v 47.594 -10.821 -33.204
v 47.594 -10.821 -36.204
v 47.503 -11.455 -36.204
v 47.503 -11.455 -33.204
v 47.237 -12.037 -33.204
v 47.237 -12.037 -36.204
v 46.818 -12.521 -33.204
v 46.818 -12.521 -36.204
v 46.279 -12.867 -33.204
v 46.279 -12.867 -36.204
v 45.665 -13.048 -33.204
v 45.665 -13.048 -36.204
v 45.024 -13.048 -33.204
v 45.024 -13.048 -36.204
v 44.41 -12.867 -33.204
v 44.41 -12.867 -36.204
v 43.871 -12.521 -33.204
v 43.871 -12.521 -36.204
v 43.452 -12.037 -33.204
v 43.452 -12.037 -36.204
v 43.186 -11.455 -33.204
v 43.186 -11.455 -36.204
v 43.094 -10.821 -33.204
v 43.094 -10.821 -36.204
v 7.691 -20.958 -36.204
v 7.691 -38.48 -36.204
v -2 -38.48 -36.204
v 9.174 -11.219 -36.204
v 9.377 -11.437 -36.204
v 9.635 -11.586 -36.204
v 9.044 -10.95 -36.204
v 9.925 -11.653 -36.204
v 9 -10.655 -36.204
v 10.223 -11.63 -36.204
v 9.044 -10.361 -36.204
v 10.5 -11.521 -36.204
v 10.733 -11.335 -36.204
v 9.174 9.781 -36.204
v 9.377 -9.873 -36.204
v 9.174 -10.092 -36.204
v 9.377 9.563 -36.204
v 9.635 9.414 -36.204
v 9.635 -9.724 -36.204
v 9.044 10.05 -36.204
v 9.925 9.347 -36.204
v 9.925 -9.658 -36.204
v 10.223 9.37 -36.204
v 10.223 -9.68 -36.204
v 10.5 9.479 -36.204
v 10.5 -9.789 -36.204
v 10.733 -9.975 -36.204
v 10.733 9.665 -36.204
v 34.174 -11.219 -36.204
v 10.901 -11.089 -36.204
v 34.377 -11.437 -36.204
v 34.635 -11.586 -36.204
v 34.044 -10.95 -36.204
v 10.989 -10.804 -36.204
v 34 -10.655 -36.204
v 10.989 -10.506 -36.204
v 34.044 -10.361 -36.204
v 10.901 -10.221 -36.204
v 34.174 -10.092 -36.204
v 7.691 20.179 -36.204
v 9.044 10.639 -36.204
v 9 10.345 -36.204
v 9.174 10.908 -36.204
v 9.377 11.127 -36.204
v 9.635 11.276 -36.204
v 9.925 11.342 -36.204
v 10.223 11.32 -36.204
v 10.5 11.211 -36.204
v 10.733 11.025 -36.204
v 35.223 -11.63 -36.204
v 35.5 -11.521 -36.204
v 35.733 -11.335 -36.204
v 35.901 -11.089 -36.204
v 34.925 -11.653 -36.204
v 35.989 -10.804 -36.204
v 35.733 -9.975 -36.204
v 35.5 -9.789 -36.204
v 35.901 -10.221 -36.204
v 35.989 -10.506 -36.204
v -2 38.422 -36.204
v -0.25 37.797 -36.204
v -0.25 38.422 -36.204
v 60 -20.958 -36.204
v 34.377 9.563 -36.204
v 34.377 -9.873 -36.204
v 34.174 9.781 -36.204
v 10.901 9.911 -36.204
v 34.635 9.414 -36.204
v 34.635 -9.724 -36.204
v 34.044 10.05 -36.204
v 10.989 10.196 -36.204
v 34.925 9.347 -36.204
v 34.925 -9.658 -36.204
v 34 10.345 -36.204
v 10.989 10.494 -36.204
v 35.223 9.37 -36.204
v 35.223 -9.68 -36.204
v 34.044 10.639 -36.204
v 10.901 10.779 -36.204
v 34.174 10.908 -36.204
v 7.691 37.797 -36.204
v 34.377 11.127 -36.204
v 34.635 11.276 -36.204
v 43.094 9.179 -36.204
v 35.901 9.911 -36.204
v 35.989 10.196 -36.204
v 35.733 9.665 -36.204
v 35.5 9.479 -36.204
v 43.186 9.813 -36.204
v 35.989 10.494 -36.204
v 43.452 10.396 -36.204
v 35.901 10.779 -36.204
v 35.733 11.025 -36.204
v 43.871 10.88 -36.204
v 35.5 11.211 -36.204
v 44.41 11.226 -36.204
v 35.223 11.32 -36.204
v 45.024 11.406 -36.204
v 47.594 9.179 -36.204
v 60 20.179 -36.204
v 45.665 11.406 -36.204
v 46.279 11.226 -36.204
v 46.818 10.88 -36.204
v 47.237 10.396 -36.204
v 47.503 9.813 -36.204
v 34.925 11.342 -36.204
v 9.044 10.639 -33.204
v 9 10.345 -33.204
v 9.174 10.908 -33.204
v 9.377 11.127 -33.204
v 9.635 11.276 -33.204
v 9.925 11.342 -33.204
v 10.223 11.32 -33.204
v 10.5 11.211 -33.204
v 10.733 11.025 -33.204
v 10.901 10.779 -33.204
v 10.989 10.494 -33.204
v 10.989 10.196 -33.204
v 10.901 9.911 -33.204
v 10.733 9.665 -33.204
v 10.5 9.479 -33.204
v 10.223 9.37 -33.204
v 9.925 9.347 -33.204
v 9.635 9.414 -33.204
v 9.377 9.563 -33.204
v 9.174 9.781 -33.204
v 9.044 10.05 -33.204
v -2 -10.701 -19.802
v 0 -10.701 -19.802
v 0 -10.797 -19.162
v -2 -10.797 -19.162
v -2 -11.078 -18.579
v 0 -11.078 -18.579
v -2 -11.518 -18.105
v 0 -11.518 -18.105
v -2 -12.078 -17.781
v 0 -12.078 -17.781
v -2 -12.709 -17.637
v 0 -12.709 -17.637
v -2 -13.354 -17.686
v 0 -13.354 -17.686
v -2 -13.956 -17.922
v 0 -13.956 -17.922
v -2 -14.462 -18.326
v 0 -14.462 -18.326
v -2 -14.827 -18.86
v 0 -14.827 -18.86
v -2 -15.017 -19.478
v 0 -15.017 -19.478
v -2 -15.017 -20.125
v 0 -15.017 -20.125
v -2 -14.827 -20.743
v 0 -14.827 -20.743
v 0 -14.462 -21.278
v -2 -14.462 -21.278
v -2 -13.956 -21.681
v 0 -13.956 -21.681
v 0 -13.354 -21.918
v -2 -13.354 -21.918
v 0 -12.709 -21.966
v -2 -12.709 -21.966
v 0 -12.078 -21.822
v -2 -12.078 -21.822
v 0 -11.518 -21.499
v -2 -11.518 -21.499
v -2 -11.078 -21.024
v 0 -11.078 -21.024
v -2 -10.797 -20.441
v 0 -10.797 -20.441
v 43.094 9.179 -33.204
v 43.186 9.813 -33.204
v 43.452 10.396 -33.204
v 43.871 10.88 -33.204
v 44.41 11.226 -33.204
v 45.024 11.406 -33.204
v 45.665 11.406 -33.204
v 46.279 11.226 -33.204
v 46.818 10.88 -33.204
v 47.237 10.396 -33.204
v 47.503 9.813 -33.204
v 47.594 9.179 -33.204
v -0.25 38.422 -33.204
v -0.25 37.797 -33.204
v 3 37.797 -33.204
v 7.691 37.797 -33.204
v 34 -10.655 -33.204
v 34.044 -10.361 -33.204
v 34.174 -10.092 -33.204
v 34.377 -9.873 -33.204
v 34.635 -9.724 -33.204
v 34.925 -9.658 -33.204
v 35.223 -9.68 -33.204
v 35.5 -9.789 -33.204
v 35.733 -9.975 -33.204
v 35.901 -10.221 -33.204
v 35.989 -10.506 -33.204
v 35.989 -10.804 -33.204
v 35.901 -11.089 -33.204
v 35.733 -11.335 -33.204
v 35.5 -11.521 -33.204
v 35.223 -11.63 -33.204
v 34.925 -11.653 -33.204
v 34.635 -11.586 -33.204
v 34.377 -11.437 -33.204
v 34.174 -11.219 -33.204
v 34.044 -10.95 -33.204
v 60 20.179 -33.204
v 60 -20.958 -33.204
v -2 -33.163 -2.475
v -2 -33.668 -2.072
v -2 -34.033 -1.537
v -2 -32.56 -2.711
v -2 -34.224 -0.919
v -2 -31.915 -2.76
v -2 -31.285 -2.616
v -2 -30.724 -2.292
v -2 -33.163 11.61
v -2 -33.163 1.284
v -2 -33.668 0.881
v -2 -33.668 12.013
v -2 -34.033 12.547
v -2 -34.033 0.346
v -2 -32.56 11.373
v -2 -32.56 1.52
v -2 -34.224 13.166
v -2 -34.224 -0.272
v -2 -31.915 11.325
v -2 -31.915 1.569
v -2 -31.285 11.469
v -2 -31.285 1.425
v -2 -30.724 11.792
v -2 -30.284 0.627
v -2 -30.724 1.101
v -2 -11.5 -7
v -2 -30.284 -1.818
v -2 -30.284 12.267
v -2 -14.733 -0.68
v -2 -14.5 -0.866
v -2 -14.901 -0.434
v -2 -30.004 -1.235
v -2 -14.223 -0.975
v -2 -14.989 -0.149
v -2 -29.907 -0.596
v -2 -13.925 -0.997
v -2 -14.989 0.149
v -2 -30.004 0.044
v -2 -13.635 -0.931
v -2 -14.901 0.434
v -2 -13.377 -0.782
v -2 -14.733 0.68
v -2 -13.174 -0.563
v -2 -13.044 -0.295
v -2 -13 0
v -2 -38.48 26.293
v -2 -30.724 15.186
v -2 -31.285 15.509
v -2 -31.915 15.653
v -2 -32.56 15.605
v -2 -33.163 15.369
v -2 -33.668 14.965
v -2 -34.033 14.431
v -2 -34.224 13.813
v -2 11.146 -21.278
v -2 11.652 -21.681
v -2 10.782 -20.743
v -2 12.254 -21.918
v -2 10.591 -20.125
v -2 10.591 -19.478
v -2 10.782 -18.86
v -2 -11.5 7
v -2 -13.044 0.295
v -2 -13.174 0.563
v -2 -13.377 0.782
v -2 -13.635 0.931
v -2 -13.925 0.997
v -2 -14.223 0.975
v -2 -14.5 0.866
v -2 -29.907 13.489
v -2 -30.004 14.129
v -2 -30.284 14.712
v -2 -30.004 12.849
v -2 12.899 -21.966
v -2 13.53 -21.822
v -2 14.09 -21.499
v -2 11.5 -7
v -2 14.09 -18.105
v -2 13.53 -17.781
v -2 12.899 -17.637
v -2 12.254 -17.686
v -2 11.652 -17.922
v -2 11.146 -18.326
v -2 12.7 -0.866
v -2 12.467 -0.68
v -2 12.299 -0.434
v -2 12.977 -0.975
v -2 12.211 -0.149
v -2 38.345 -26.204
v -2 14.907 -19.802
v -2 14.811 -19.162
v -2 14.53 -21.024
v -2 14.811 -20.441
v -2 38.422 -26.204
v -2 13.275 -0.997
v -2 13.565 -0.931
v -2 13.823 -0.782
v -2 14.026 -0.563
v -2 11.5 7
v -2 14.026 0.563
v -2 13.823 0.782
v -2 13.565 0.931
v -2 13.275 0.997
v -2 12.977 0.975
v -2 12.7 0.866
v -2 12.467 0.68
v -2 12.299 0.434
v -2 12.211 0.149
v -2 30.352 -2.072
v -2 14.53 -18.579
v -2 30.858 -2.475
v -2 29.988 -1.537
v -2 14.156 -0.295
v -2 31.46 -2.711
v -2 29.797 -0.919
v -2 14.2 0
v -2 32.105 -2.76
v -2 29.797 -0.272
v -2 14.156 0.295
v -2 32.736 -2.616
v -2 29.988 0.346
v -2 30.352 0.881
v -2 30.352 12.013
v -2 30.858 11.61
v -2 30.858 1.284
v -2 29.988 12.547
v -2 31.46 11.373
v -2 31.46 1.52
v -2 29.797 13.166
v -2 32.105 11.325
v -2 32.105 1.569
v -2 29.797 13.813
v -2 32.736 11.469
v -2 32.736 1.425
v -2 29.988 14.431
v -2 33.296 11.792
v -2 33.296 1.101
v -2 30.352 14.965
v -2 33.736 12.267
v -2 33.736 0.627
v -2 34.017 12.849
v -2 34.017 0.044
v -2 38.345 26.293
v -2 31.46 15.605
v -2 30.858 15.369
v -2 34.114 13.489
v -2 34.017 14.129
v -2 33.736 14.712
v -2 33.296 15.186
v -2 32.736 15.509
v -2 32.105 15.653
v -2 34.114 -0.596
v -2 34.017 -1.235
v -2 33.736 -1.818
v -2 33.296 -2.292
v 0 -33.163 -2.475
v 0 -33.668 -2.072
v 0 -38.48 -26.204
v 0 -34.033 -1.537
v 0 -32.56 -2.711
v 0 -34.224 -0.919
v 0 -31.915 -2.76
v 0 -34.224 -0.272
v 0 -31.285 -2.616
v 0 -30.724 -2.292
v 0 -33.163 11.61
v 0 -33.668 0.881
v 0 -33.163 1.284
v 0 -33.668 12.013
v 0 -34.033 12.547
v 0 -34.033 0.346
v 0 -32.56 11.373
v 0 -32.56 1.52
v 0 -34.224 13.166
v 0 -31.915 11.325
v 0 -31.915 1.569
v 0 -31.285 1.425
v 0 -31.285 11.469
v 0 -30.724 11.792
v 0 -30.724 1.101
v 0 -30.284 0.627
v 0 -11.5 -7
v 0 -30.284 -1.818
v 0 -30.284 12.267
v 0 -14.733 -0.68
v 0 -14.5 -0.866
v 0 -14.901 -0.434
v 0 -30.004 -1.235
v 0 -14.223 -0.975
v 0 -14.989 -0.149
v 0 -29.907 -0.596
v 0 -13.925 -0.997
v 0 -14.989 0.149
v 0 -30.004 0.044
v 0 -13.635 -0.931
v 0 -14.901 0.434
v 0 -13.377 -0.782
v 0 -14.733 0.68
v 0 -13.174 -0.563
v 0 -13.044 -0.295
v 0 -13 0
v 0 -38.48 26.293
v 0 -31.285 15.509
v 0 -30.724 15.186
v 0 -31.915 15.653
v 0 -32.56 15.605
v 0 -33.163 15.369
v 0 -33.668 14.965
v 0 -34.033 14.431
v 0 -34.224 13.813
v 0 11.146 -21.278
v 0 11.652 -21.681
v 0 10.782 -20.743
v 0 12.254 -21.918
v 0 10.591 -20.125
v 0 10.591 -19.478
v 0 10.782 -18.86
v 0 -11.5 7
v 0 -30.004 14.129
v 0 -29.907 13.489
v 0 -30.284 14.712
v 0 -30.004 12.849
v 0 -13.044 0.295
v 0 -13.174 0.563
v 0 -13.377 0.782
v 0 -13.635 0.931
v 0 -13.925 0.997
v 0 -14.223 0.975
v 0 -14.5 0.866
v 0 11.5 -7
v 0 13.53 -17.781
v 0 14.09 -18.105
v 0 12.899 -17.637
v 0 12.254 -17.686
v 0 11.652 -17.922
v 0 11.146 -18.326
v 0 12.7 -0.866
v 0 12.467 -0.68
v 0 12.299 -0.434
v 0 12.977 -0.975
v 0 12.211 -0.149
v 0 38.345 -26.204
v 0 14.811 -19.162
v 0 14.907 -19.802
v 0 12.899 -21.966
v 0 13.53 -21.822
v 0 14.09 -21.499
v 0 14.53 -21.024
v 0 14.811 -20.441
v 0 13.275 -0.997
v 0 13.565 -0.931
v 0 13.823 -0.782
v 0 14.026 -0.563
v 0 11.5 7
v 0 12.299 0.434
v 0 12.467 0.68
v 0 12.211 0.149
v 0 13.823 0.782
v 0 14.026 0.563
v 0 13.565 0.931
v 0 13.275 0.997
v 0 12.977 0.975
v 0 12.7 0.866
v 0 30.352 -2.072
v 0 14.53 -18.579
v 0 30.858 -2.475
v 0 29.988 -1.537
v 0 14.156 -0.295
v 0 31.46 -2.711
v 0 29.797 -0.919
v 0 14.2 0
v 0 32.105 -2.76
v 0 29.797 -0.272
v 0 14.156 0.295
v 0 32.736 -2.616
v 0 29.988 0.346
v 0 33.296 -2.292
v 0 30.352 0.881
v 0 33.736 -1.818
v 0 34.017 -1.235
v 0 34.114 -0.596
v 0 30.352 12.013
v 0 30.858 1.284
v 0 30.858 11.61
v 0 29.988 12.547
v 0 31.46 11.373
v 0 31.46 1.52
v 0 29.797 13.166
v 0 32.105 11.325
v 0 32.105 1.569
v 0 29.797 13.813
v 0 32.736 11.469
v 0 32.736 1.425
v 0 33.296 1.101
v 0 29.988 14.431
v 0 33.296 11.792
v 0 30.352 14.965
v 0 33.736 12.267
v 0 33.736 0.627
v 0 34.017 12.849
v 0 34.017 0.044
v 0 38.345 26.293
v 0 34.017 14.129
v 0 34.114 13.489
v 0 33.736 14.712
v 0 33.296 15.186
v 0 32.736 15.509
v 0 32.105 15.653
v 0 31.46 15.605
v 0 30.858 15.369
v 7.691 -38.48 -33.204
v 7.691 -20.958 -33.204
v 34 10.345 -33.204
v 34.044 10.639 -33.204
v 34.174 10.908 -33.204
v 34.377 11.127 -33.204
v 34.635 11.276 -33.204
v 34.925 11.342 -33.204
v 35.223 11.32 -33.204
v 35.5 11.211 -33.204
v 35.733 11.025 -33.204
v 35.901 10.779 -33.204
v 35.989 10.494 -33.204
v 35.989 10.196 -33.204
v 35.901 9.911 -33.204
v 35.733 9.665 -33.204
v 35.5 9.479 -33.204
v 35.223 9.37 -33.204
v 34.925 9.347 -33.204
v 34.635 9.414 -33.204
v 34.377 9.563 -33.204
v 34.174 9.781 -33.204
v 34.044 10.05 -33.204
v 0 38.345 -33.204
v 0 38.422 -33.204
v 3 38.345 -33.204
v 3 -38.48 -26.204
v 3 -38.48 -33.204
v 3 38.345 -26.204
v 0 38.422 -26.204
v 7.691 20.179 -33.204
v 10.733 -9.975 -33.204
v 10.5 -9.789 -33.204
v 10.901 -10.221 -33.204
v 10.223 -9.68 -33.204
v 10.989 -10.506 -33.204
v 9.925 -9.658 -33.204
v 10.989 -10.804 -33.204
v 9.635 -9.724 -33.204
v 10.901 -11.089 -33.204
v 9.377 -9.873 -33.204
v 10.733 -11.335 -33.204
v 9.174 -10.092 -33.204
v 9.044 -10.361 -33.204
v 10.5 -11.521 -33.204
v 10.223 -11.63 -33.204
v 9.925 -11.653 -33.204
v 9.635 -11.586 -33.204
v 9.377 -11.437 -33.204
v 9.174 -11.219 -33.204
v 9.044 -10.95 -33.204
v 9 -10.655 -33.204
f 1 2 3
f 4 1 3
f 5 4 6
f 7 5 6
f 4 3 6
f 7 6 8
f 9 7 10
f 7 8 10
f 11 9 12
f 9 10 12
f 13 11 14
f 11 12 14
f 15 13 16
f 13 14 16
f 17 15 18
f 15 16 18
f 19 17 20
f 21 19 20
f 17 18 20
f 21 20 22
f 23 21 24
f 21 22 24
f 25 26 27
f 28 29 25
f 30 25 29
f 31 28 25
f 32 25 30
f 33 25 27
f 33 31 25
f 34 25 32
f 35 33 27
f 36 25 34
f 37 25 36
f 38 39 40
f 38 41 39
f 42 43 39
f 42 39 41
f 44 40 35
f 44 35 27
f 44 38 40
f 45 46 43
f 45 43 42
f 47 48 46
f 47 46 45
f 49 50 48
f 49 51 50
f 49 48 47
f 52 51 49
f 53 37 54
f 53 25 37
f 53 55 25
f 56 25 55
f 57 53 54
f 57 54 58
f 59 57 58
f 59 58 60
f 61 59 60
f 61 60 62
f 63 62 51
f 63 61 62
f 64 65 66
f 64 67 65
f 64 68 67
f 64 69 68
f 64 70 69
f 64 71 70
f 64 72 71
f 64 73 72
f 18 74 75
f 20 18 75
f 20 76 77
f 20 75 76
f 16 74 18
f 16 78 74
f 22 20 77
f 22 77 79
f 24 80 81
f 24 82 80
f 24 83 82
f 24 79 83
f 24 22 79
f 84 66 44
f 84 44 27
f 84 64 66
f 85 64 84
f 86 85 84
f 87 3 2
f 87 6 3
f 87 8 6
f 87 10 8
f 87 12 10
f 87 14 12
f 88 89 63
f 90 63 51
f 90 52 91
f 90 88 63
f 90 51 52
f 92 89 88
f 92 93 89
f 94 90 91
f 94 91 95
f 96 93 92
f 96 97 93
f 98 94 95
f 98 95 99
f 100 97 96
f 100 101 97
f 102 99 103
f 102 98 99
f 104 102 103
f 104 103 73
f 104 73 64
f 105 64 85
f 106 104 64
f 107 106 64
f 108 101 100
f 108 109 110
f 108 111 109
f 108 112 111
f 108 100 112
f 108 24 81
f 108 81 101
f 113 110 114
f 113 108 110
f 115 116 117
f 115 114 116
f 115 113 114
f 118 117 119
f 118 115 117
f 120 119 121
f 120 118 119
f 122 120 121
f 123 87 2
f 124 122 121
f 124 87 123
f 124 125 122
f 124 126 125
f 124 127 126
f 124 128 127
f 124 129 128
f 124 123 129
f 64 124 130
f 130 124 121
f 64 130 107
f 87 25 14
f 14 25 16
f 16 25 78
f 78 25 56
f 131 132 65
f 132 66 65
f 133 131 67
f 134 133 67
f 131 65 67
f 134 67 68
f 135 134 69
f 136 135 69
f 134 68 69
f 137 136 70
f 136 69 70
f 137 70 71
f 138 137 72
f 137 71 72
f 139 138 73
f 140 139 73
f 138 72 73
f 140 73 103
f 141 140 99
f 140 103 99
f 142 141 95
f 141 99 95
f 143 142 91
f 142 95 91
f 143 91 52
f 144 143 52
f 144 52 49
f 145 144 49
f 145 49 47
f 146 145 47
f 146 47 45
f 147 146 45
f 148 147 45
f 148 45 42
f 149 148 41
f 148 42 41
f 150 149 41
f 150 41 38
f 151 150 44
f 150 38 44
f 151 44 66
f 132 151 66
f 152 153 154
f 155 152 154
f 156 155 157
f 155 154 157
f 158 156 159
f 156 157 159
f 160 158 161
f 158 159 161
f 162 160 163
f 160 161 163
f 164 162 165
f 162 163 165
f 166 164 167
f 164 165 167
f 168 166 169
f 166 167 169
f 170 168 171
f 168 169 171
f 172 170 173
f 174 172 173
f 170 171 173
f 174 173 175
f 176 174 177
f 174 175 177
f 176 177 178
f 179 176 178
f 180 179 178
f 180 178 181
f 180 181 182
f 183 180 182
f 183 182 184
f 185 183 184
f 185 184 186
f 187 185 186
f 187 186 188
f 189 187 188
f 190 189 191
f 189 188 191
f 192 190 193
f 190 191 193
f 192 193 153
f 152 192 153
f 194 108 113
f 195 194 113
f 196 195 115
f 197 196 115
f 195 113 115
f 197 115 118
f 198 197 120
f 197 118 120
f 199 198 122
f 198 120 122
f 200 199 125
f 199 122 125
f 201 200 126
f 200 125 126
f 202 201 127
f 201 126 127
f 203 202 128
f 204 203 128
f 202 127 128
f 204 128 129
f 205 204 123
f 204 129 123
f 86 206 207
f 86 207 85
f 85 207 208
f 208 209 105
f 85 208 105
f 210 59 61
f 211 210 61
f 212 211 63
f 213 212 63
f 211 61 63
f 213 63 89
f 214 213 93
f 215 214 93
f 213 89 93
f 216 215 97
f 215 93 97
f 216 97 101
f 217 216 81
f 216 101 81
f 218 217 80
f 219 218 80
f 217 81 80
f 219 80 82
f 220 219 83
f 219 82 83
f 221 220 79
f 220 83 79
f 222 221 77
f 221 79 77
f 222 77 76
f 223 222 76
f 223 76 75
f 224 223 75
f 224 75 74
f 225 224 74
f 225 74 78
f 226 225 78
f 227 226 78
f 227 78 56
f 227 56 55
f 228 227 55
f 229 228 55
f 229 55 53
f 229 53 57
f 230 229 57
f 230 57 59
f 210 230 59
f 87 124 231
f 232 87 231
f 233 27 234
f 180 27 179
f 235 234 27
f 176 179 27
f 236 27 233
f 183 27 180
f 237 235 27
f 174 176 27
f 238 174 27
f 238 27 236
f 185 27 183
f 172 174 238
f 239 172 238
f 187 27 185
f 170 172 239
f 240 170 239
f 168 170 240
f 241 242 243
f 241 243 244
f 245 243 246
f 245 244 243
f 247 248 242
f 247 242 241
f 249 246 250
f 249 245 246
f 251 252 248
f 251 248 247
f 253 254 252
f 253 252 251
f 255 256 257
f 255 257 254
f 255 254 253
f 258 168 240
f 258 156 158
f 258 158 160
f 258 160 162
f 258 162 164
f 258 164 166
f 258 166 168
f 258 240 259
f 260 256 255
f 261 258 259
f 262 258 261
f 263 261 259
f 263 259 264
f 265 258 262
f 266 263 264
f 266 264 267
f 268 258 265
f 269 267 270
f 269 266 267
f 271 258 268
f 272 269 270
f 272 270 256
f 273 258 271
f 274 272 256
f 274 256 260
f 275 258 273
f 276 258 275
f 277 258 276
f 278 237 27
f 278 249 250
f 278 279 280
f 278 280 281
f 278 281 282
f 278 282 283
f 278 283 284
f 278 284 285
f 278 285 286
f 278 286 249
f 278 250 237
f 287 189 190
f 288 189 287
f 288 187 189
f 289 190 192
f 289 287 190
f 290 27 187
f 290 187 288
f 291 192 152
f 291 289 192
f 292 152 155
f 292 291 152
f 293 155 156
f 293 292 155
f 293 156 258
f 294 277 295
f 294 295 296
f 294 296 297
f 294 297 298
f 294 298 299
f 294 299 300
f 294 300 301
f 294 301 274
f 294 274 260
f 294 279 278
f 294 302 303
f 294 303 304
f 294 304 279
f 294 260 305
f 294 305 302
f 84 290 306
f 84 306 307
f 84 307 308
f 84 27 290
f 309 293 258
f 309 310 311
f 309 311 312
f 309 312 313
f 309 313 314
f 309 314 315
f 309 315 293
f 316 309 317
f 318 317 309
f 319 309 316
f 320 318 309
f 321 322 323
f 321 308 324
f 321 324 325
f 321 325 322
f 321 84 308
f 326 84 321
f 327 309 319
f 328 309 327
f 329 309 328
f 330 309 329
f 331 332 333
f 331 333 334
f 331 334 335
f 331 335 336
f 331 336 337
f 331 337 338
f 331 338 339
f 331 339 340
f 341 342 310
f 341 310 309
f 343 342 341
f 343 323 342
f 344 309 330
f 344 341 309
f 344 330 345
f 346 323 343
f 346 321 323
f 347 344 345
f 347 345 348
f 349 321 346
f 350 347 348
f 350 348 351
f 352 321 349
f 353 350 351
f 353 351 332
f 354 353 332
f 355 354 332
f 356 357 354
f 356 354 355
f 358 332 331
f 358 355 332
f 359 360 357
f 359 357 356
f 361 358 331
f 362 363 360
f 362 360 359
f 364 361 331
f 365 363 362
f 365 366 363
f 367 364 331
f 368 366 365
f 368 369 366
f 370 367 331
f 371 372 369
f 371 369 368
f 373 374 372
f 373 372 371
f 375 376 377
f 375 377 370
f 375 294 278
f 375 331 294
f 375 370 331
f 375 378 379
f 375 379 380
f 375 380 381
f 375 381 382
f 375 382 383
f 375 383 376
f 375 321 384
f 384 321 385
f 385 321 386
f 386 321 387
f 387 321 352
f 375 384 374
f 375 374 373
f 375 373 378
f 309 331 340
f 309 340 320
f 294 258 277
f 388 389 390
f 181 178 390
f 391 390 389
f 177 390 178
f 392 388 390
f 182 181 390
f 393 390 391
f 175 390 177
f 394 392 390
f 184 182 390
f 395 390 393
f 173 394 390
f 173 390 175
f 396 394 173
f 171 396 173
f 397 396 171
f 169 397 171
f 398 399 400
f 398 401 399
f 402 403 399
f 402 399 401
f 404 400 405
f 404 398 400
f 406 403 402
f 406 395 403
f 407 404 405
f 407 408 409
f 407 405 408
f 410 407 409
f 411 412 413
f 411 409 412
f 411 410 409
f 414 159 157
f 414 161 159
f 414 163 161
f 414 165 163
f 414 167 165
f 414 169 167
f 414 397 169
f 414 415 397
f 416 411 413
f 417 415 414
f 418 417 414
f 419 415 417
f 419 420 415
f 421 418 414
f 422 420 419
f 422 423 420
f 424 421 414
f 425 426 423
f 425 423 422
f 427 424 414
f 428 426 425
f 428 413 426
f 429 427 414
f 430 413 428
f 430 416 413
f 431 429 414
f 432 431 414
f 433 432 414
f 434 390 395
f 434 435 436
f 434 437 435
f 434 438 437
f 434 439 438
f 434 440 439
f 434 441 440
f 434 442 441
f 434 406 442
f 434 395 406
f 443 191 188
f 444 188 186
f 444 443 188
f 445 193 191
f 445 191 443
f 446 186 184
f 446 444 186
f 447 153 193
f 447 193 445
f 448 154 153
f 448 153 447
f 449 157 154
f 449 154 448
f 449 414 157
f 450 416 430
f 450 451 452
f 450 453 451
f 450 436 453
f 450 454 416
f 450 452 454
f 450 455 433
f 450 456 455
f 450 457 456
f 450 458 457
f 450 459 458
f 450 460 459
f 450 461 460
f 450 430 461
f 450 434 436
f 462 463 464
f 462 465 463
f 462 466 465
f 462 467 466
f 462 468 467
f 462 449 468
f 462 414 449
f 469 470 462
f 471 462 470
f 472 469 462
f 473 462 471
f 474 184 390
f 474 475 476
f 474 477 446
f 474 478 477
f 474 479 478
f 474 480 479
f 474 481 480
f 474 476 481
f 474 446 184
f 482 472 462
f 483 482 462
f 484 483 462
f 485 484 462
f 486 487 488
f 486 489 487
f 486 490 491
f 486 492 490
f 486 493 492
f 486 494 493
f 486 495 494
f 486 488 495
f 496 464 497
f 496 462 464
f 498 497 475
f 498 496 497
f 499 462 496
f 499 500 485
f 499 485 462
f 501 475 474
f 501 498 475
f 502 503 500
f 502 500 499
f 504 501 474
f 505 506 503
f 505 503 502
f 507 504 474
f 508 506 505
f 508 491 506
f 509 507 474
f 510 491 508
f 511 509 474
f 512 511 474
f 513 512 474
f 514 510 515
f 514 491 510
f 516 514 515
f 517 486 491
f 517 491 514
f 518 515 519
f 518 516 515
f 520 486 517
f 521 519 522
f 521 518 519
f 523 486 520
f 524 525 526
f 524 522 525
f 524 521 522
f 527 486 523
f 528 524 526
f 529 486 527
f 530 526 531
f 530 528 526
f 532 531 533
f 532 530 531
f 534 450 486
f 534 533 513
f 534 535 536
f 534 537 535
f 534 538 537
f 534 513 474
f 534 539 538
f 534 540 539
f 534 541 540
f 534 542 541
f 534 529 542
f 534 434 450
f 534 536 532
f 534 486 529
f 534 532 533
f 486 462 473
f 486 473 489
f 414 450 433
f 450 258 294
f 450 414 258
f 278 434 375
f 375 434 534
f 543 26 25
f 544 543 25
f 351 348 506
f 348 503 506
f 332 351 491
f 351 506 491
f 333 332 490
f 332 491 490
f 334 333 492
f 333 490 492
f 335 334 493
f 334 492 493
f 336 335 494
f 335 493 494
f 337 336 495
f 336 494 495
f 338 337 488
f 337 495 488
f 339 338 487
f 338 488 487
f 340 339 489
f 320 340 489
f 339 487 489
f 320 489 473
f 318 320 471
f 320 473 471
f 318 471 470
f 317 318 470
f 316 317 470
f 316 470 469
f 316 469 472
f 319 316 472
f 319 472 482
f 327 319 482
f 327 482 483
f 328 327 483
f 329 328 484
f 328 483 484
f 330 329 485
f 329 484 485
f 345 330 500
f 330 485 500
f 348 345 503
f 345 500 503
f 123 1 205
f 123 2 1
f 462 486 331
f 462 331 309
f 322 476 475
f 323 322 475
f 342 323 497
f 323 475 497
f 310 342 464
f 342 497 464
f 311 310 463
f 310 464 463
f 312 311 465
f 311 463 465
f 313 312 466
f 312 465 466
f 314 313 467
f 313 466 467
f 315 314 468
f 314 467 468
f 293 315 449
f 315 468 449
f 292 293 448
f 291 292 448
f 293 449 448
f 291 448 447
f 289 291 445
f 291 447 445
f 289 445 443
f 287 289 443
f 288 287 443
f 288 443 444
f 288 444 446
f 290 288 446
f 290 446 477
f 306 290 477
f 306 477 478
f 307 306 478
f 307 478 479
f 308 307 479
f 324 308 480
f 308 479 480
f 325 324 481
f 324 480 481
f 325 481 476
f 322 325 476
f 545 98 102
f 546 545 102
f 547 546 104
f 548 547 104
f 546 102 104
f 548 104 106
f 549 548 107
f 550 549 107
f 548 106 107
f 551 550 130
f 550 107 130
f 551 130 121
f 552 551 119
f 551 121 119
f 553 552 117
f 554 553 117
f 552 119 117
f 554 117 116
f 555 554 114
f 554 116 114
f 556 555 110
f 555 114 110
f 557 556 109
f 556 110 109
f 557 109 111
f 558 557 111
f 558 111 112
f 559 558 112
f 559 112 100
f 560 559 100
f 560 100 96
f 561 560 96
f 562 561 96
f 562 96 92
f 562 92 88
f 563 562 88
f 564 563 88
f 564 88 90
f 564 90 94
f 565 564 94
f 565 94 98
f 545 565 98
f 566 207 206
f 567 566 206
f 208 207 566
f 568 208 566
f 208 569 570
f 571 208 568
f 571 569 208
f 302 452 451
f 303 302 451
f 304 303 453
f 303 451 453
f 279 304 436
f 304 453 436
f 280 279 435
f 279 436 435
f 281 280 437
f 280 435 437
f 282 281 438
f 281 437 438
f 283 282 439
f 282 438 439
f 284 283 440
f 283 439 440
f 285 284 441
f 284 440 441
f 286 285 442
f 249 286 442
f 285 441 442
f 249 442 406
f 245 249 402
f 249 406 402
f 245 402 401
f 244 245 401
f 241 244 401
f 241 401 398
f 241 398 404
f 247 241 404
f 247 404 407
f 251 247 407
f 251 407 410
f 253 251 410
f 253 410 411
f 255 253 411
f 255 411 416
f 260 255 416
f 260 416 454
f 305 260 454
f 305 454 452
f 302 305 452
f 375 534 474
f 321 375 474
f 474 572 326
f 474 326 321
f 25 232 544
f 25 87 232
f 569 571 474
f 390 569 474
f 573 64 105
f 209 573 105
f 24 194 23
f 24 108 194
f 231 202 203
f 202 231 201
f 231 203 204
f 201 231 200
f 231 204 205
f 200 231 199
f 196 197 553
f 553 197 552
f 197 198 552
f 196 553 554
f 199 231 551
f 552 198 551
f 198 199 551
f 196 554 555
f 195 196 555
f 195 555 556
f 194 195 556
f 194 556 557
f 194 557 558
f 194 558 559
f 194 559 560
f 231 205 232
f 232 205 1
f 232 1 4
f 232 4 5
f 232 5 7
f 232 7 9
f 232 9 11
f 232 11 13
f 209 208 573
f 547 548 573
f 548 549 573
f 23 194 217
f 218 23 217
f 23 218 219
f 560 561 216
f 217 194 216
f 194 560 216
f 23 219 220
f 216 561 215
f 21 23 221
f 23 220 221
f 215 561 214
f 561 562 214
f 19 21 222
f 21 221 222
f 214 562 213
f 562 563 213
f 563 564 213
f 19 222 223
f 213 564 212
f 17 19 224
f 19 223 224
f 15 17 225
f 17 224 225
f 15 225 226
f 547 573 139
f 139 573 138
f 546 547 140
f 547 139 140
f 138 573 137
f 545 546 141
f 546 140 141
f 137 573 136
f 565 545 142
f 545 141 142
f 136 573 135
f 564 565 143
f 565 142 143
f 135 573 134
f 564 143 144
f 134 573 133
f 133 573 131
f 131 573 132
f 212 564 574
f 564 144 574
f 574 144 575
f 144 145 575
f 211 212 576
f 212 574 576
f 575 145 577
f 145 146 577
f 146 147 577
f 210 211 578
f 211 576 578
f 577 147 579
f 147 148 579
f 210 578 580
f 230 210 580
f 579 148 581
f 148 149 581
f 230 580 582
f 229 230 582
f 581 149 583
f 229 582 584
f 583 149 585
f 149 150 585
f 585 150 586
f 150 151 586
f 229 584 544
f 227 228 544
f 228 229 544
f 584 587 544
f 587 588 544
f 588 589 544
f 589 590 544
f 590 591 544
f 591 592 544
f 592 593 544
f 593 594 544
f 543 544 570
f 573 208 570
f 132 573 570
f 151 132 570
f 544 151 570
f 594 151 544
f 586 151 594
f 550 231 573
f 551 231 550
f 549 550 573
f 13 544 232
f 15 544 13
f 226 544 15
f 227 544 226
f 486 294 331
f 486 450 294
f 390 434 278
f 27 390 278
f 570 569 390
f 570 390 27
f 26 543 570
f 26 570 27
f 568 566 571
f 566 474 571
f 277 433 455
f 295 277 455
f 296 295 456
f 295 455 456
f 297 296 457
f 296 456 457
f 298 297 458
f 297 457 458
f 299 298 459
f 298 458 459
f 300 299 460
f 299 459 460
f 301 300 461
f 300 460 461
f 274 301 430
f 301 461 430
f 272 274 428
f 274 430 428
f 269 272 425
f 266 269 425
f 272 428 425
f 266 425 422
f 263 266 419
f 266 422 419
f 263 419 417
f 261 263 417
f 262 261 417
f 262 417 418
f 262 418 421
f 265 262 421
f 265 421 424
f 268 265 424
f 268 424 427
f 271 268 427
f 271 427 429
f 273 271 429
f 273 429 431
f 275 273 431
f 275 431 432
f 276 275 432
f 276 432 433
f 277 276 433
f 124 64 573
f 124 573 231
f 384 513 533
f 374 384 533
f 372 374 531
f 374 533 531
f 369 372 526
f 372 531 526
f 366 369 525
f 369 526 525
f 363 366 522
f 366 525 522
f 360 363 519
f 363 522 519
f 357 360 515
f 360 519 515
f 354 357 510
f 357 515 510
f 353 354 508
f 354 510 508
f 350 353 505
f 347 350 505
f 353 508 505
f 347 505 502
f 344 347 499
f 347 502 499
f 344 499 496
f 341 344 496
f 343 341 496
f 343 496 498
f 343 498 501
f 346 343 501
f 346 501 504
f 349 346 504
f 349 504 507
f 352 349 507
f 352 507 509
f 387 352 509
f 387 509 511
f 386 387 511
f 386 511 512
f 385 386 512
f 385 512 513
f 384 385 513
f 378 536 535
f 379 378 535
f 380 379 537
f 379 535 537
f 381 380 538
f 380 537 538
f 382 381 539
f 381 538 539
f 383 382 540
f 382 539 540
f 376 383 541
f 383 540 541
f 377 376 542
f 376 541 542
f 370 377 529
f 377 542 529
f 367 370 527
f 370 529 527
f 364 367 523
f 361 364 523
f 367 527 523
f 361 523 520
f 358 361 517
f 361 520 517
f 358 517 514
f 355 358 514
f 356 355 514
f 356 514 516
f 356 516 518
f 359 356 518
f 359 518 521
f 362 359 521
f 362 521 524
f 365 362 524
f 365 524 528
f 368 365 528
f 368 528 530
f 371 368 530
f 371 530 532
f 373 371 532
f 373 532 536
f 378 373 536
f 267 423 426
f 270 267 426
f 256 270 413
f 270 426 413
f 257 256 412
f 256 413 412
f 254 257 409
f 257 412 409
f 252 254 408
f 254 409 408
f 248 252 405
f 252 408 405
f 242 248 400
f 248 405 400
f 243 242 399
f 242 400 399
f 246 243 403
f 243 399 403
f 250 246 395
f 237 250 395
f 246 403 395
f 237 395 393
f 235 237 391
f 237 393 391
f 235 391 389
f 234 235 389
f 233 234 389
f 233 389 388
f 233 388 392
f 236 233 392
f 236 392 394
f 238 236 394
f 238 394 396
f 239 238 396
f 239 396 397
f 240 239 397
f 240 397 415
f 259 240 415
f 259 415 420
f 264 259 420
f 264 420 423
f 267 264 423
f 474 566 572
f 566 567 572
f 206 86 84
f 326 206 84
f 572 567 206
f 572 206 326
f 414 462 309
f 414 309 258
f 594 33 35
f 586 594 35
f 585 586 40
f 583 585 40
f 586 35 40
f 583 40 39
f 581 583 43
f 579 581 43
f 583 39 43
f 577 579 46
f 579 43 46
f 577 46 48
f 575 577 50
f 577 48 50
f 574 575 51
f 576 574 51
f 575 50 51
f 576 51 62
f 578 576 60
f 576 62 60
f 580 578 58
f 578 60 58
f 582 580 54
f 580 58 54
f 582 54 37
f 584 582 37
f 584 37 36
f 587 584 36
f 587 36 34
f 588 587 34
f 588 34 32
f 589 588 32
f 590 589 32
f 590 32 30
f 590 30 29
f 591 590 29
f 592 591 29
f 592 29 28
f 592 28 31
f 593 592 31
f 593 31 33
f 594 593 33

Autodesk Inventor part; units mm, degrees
sketch "Sketch1" plane through (0, 0, 0) normal (1, 0, 0) x (0, 1, 0)
  circle A0 centre (-12.8712, -19.8017) radius 2.1703
  circle A1 centre (-32.0775, -0.5955) radius 2.1703
  circle A2 centre (31.9433, -0.5955) radius 2.1703
  circle A3 centre (31.9433, 13.4891) radius 2.1703
  circle A4 centre (-32.0775, 13.4891) radius 2.1703
  circle A5 centre (12.7371, -19.8017) radius 2.1703
  line L0 (38.3454, 26.2933) -> (38.3454, -26.2038)
  line L1 (-38.4796, 26.2933) -> (38.3454, 26.2933)
  line L2 (-38.4796, 26.2933) -> (-38.4796, -26.2038)
  line L3 (38.3454, -26.2038) -> (-38.4796, -26.2038)
  circle A6 centre (-32.0775, 13.4891) radius 2.1703
  circle A7 centre (-32.0775, -0.5955) radius 2.1703
  line L4 (11.5, -7) -> (-11.5, -7)
  line L5 (-11.5, -7) -> (-11.5, 7)
  line L6 (-11.5, 7) -> (11.5, 7)
  line L7 (11.5, 7) -> (11.5, -7)
  line L8 (11.5, -7) -> (-11.5, 7) construction
  line L9 (-11.5, -7) -> (11.5, 7) construction
  circle A8 centre (13.2, 0) radius 1
  circle A9 centre (-14, 0) radius 1
  point P0 (0, 0)
  point P1 (-11.5, 0)
  dimension "d26" = 23
  dimension "d27" = 14
  dimension "d28" = 27.2
  dimension "d29" = 2
  dimension "d30" = 2.5
ref_plane "Work Plane6" through (0, -38.4796, -26.2038) normal (0, 0, -1) x (-1, 0, 0)
sketch "Sketch3" plane through (0, -38.4796, -26.2038) normal (0, 0, -1) x (-1, 0, 0)
  line L0 (0, 76.825) -> (-3, 76.825) projected
  line L1 (0, 0) -> (-3, 0) projected
  line L2 (-3, 76.825) -> (0, 76.825)
  line L3 (0, 76.825) -> (0, 0)
  line L4 (0, 0) -> (-3, 0)
  line L5 (-3, 0) -> (-3, 76.825)
  line L6 (0, 0) -> (0, 76.825) projected
  line L7 (-3, 0) -> (-3, 76.825) projected
  line L8 (0.01, -0.01) -> (0.01, 76.835)
  line L9 (0.01, 76.835) -> (-3.01, 76.835)
  line L10 (-3.01, 76.835) -> (-3.01, -0.01)
  line L11 (-3.01, -0.01) -> (0.01, -0.01)
  point P0 (0, 38.4796)
  dimension "d3" = 0.01
extrude "Extrusion2" add sketch "Sketch3" along normal blind 10 contours L3 L1 L5 L0
ref_plane "Work Plane3" through (0, 0, 0) normal (-1, 0, 0) x (0, 0, 1)
sketch "Sketch4" plane through (0, 0, 0) normal (-1, 0, 0) x (0, 0, 1)
  line L0 (26.2933, -38.4796) -> (-36.2038, -38.4796) projected
  line L1 (-36.2038, 38.422) -> (-33.2038, 38.422)
  line L2 (-33.2038, 38.422) -> (-33.2038, -38.4796)
  line L3 (-33.2038, -38.4796) -> (-36.2038, -38.4796)
  line L4 (-36.2038, -38.4796) -> (-36.2038, 38.422)
  line L5 (-36.2038, 38.3454) -> (-36.2038, -38.4796) projected
  point P0 (0, 0)
  dimension "d8" = 3
extrude "Extrusion3" add sketch "Sketch4" against normal blind 60
ref_plane "Work Plane1" through (0, -38.4796, -36.2038) normal (0, 0, -1) x (-1, 0, 0)
ref_plane "Work Plane4" through (0, -38.4796, -36.2038) normal (0, 0, -1) x (-1, 0, 0)
sketch "Sketch6" plane through (0, -38.4796, -36.2038) normal (0, 0, -1) x (-1, 0, 0)
  line L0 (0, 38.4796) -> (-60, 38.4508)
  line L1 (-60, 0) -> (-60, 76.9016) projected
  line L2 (-30, 76.2766) -> (-30, 0)
  line L3 (-43.0944, 47.6588) -> (-43.0944, 27.6588)
  arc A0 (-47.5944, 27.6588) -> (-43.0944, 27.6588) centre (-45.3444, 27.6588) ccw
  line L4 (-47.5944, 27.6588) -> (-47.5944, 47.6588)
  arc A1 (-43.0944, 47.6588) -> (-47.5944, 47.6588) centre (-45.3444, 47.6588) ccw
  circle A2 centre (-35, 27.8243) radius 1
  circle A3 centre (-10, 27.8243) radius 1
  circle A4 centre (-35, 48.8243) radius 1
  circle A5 centre (-10, 48.8243) radius 1
  line L5 (-57.8444, 58.6588) -> (-57.8444, 17.5214)
  line L6 (-57.8444, 17.5214) -> (-2.3444, 17.5214)
  line L7 (-2.3444, 17.5214) -> (-2.3444, 58.6588)
  line L8 (-2.3444, 58.6588) -> (-57.8444, 58.6588)
  line L9 (-57.8444, 58.6588) -> (-60, 58.6588)
  line L10 (-2.3444, 58.6588) -> (0, 58.6588)
  line L11 (0, 58.6588) -> (0, 17.5214)
  line L12 (0, 17.5214) -> (-2.3444, 17.5214)
  line L13 (-57.8444, 17.5214) -> (-60, 17.5214)
  line L14 (0, 0) -> (-60, 0) projected
  line L15 (-7.6908, 17.5214) -> (-60, 17.5214)
  line L16 (-60, 17.5214) -> (-60, 0)
  line L17 (-60, 0) -> (-7.6908, 0)
  line L18 (-7.6908, 0) -> (-7.6908, 17.5214)
  line L19 (-7.6908, 76.2766) -> (-60, 76.2766)
  line L20 (-60, 76.2766) -> (-60, 58.6588)
  line L21 (-60, 58.6588) -> (-7.6908, 58.6588)
  line L22 (-7.6908, 58.6588) -> (-7.6908, 76.2766)
  point P0 (0, 76.9016)
  point P1 (-57.8444, 34.2959)
  dimension "d12" = 25
  dimension "d13" = 35
  dimension "d14" = 35
  dimension "d15" = 25
extrude "Extrusion4" cut sketch "Sketch6" against normal blind 60 contours L3 A0 L4 L0 | L0 L4 A1 L3 | L8 L9 L1 L19 L2 | L2 L19 L22 L8 | L6 L18 L14 L2 | L2 L14 L1 L13 L6 | A2 | A3 | A4 | A5
sketch "Sketch7" plane through (0, -38.4796, -36.2038) normal (0, 0, -1) x (-1, 0, 0)
  point P0 (0, 38.4796)
extrude "Extrusion7" add sketch "Sketch1" against normal blind 2
ref_plane "Work Plane7" through (0, 38.422, -36.2038) normal (-1, 0, 0) x (0, 0, 1)
sketch "Sketch9" plane through (0, 38.422, -36.2038) normal (-1, 0, 0) x (0, 0, 1)
  line L0 (0, -76.9016) -> (0, 0) projected
  line L1 (0, 0) -> (10, 0)
  line L2 (10, 0) -> (10, -76.9016)
  line L3 (10, -76.9016) -> (0, -76.9016)
  line L4 (0, -76.9016) -> (0, 0)
  point P0 (36.2038, -38.422)
extrude "Extrusion8" add sketch "Sketch9" along normal blind 2
sketch "Sketch10" plane through (60, 0, 0) normal (1, 0, 0) x (0, 0, -1)
  line L0 (36.2038, 38.422) -> (33.2038, 38.422) projected
  line L1 (33.2038, 37.797) -> (36.2038, 37.797) projected
  line L2 (33.2038, 38.422) -> (36.2038, 38.422)
  line L3 (36.2038, 38.422) -> (36.2038, 37.797)
  line L4 (36.2038, 37.797) -> (33.2038, 37.797)
  line L5 (33.2038, 37.797) -> (33.2038, 38.422)
  point P0 (0, 0)
extrude "Extrusion9" cut sketch "Sketch10" against normal blind 60.25
properties part number "cameramount"
